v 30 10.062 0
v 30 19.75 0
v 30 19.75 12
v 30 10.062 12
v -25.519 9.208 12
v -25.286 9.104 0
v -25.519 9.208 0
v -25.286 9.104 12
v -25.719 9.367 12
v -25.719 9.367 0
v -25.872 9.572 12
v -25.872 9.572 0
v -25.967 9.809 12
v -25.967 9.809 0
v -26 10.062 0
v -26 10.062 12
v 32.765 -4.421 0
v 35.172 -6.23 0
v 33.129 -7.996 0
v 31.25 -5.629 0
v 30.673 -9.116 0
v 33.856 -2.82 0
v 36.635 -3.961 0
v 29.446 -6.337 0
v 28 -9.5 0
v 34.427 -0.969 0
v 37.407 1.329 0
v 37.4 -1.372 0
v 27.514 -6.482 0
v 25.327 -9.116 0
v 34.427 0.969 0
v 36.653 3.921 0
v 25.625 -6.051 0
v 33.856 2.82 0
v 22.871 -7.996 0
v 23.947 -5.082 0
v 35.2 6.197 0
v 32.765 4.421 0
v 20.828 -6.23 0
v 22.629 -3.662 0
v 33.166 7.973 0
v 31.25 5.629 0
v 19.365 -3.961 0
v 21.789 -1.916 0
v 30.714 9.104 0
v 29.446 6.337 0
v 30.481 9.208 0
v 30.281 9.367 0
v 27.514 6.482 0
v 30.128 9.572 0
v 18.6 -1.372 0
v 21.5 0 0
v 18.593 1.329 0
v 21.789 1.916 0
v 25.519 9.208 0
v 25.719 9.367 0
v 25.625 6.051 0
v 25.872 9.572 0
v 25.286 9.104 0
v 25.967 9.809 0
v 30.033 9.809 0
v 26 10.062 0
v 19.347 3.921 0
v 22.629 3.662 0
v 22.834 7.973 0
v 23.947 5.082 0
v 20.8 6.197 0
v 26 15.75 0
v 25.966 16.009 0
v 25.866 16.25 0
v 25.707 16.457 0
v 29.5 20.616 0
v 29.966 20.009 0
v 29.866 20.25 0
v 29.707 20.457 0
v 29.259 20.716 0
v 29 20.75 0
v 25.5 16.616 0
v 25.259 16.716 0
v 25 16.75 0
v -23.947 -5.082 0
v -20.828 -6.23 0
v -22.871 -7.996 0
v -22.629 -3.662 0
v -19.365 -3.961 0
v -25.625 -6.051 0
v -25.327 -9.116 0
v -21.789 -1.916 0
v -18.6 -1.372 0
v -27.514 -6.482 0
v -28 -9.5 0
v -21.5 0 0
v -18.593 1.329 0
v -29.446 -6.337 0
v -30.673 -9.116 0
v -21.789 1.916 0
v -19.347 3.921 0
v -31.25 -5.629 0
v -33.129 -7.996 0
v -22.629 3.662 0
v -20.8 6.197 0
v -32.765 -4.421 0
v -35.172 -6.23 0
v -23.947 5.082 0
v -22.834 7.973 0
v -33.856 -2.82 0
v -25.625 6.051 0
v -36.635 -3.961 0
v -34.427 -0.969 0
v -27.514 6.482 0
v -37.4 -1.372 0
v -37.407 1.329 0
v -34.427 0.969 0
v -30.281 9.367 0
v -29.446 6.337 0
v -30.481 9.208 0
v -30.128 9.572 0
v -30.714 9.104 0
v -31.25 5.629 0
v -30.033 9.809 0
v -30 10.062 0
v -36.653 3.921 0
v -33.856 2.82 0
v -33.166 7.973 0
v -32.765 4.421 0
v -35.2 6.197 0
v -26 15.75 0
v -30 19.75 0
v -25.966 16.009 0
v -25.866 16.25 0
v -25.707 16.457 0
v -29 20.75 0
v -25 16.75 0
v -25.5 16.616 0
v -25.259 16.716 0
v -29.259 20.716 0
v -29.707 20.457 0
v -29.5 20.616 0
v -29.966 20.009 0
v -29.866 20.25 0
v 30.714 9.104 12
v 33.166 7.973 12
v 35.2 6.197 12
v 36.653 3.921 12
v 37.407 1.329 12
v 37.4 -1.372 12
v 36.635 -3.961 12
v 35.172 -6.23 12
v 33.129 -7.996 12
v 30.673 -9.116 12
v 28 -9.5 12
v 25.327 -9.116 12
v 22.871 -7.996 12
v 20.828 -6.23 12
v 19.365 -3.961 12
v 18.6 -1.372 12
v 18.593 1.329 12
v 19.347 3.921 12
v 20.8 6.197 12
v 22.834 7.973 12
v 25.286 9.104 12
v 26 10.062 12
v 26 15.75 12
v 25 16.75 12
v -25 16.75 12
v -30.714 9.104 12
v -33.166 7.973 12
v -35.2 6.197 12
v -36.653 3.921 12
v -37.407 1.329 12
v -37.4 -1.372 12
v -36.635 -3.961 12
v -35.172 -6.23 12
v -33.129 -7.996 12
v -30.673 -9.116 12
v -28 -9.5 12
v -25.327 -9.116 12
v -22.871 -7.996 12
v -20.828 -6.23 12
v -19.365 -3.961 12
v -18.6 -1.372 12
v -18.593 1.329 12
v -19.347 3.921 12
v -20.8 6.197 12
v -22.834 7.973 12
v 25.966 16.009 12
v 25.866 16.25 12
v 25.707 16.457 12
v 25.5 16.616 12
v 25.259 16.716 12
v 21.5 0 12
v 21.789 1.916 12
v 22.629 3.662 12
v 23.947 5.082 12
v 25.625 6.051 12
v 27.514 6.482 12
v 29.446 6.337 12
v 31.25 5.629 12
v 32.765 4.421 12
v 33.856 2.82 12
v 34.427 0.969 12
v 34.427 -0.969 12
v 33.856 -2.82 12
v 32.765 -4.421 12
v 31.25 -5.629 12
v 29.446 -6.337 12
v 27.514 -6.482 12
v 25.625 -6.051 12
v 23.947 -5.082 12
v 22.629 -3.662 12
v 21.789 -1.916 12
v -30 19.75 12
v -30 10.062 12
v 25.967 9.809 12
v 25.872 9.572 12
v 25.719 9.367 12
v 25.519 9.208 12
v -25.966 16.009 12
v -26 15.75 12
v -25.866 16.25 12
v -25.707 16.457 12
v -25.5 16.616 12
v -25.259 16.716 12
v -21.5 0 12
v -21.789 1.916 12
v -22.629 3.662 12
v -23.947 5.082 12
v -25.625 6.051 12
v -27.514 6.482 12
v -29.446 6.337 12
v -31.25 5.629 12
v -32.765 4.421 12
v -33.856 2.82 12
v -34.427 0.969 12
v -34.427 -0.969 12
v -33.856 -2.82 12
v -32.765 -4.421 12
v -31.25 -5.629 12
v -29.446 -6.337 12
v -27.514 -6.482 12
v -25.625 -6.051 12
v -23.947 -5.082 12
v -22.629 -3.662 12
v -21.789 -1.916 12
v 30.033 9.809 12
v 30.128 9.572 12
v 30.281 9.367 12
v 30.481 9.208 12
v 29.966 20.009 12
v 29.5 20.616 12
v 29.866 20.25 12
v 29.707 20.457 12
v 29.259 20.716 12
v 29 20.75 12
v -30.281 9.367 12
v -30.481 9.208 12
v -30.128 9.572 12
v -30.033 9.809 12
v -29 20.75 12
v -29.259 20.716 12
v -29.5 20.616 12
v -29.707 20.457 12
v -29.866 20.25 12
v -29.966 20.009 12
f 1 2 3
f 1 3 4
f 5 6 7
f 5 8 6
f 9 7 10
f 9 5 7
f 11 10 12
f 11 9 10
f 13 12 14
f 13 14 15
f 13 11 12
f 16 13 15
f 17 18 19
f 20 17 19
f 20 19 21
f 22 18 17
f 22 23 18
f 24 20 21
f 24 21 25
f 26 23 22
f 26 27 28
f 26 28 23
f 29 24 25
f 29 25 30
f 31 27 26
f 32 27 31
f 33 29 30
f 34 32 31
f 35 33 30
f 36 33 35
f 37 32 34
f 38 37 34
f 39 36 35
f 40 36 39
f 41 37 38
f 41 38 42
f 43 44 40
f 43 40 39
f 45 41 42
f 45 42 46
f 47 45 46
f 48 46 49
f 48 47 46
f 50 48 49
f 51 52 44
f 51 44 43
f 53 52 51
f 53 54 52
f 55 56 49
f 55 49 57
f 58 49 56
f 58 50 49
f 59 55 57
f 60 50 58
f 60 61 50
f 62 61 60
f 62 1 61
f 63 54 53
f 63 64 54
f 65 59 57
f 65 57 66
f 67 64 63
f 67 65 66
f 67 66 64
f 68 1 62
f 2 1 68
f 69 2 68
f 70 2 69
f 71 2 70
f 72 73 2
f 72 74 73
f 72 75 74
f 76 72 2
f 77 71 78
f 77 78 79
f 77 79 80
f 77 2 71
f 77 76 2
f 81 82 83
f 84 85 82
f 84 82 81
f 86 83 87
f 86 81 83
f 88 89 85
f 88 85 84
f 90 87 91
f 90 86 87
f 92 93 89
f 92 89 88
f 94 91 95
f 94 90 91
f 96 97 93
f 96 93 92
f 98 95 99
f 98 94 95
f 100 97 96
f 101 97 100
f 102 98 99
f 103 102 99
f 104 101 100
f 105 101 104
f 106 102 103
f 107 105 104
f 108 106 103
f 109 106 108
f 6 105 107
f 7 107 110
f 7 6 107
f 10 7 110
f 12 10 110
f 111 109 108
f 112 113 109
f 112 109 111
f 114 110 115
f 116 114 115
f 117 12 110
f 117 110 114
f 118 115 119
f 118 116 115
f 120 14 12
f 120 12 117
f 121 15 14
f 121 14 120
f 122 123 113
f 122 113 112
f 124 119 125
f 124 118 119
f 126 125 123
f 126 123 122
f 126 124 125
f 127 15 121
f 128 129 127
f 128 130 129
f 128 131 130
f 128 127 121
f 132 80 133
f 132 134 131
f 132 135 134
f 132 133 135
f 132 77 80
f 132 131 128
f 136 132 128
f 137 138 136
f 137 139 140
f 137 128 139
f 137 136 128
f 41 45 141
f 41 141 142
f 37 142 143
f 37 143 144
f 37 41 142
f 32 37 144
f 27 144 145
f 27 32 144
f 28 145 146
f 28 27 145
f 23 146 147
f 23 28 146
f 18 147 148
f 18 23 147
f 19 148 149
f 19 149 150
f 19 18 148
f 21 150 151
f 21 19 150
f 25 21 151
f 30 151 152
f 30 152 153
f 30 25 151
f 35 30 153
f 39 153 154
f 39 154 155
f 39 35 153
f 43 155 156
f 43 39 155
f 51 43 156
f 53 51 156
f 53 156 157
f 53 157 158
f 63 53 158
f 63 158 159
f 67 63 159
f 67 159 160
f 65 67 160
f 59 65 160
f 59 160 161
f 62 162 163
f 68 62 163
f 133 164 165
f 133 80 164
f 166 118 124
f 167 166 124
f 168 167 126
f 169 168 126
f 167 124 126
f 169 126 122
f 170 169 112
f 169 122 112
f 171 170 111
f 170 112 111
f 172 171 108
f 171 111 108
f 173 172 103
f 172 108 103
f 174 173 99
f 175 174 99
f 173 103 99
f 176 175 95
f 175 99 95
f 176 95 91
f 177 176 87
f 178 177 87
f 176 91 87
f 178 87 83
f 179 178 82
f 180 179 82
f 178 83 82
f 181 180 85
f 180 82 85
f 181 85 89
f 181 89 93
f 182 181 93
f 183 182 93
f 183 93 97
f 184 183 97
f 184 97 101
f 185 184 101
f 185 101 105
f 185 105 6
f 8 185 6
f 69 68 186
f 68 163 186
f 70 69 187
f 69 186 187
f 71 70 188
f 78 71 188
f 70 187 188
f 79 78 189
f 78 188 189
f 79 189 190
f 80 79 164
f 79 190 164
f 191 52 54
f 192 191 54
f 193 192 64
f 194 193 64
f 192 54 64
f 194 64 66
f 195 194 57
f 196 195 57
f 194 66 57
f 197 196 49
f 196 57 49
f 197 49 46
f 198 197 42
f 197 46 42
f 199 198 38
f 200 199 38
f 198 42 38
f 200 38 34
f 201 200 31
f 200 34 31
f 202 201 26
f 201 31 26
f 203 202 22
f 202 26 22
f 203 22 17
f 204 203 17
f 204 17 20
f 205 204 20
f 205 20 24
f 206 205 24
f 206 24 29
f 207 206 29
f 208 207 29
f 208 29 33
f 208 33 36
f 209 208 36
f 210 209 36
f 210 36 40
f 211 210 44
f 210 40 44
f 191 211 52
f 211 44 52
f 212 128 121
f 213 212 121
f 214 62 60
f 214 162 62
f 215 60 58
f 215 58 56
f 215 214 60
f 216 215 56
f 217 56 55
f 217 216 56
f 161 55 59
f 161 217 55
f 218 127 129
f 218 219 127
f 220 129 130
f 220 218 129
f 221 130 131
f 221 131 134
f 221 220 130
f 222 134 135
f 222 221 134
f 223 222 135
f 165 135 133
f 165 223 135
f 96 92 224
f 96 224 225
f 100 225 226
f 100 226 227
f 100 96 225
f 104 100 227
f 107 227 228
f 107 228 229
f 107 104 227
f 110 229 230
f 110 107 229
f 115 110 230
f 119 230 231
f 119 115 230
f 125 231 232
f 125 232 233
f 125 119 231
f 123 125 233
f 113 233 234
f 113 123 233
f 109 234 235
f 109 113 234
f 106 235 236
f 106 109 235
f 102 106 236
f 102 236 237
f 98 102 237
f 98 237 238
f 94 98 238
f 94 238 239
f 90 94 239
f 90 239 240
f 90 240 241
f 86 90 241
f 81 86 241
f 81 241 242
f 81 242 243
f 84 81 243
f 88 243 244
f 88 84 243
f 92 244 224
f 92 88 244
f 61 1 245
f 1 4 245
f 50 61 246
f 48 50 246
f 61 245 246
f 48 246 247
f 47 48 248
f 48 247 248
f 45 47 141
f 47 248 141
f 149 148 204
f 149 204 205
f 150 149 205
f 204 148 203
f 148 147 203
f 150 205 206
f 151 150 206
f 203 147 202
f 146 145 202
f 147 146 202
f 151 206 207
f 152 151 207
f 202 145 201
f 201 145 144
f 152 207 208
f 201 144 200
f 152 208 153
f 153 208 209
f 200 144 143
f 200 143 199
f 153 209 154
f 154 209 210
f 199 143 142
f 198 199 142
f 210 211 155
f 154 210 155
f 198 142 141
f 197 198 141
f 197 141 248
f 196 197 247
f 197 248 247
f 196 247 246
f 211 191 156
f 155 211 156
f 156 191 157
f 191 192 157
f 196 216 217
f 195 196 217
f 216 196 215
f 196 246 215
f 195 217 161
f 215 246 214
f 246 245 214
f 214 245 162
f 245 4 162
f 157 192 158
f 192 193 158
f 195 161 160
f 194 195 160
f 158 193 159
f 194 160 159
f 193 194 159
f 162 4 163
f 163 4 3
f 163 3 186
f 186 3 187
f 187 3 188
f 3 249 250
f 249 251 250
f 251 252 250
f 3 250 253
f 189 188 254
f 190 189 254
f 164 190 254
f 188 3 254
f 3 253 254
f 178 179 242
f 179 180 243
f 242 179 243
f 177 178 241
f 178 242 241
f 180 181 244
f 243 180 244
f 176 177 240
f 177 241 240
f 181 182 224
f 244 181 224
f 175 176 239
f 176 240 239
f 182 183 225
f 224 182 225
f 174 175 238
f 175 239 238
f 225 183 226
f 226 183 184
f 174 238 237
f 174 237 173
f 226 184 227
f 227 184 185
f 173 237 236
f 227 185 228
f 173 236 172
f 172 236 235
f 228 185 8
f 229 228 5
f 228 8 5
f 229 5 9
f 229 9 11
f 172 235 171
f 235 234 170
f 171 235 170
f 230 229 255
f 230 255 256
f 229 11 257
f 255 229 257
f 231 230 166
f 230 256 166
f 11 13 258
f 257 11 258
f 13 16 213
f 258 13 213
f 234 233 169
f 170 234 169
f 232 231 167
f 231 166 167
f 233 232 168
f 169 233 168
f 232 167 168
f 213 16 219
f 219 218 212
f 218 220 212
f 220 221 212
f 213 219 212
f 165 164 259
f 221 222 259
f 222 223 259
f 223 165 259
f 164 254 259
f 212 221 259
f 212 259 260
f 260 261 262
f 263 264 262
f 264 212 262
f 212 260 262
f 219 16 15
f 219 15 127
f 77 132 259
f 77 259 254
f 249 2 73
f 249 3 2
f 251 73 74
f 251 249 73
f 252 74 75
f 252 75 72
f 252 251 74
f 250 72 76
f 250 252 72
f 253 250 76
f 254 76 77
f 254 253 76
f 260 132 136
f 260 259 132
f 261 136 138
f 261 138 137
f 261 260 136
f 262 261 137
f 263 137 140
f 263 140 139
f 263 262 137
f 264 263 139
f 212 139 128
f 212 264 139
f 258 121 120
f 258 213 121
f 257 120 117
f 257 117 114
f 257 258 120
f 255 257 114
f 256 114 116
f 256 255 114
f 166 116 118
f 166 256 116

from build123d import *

# Parameters (mm, degrees)
SKETCH1_R           = 6.5
BOSS_EXTRUDE1_DEPTH = 12
FILLET1_R           = 1


with BuildPart() as part:
    # Sketch1 → Boss-Extrude1 (new body)
    with BuildSketch(Plane.XY):
        with BuildLine():
            Line((-26, 9.287087811), (-26, 16.75))
            Line((-26, 16.75), (0, 16.75))
            Line((0, 16.75), (0, 20.75))
            Line((0, 20.75), (-30, 20.75))
            Line((-30, 20.75), (-30, 9.287087811))
            ThreePointArc((-30, 9.287087811), (-28, -9.5), (-26, 9.287087811))
        make_face()
        with Locations((-28, 0)):
            Circle(SKETCH1_R, mode=Mode.SUBTRACT)
    boss_extrude1 = extrude(amount=BOSS_EXTRUDE1_DEPTH)

    # Mirror1: Boss-Extrude1 across plane
    add(boss_extrude1.mirror(Plane(origin=(0, 0, 0), x_dir=(0, 0, 1), z_dir=(1, 0, 0))))

    # Fillet1
    fillet1_edges = [part.edges().sort_by_distance(p)[0] for p in [
        (-30, 9.287087811, 6),
        (-30, 20.75, 6),
        (-26, 16.75, 6),
        (-26, 9.287087811, 6),
        (26, 9.287087811, 6),
        (30, 9.287087811, 6),
        (30, 20.75, 6),
        (26, 16.75, 6),
    ]]
    fillet(fillet1_edges, radius=FILLET1_R)


solid = part.part
